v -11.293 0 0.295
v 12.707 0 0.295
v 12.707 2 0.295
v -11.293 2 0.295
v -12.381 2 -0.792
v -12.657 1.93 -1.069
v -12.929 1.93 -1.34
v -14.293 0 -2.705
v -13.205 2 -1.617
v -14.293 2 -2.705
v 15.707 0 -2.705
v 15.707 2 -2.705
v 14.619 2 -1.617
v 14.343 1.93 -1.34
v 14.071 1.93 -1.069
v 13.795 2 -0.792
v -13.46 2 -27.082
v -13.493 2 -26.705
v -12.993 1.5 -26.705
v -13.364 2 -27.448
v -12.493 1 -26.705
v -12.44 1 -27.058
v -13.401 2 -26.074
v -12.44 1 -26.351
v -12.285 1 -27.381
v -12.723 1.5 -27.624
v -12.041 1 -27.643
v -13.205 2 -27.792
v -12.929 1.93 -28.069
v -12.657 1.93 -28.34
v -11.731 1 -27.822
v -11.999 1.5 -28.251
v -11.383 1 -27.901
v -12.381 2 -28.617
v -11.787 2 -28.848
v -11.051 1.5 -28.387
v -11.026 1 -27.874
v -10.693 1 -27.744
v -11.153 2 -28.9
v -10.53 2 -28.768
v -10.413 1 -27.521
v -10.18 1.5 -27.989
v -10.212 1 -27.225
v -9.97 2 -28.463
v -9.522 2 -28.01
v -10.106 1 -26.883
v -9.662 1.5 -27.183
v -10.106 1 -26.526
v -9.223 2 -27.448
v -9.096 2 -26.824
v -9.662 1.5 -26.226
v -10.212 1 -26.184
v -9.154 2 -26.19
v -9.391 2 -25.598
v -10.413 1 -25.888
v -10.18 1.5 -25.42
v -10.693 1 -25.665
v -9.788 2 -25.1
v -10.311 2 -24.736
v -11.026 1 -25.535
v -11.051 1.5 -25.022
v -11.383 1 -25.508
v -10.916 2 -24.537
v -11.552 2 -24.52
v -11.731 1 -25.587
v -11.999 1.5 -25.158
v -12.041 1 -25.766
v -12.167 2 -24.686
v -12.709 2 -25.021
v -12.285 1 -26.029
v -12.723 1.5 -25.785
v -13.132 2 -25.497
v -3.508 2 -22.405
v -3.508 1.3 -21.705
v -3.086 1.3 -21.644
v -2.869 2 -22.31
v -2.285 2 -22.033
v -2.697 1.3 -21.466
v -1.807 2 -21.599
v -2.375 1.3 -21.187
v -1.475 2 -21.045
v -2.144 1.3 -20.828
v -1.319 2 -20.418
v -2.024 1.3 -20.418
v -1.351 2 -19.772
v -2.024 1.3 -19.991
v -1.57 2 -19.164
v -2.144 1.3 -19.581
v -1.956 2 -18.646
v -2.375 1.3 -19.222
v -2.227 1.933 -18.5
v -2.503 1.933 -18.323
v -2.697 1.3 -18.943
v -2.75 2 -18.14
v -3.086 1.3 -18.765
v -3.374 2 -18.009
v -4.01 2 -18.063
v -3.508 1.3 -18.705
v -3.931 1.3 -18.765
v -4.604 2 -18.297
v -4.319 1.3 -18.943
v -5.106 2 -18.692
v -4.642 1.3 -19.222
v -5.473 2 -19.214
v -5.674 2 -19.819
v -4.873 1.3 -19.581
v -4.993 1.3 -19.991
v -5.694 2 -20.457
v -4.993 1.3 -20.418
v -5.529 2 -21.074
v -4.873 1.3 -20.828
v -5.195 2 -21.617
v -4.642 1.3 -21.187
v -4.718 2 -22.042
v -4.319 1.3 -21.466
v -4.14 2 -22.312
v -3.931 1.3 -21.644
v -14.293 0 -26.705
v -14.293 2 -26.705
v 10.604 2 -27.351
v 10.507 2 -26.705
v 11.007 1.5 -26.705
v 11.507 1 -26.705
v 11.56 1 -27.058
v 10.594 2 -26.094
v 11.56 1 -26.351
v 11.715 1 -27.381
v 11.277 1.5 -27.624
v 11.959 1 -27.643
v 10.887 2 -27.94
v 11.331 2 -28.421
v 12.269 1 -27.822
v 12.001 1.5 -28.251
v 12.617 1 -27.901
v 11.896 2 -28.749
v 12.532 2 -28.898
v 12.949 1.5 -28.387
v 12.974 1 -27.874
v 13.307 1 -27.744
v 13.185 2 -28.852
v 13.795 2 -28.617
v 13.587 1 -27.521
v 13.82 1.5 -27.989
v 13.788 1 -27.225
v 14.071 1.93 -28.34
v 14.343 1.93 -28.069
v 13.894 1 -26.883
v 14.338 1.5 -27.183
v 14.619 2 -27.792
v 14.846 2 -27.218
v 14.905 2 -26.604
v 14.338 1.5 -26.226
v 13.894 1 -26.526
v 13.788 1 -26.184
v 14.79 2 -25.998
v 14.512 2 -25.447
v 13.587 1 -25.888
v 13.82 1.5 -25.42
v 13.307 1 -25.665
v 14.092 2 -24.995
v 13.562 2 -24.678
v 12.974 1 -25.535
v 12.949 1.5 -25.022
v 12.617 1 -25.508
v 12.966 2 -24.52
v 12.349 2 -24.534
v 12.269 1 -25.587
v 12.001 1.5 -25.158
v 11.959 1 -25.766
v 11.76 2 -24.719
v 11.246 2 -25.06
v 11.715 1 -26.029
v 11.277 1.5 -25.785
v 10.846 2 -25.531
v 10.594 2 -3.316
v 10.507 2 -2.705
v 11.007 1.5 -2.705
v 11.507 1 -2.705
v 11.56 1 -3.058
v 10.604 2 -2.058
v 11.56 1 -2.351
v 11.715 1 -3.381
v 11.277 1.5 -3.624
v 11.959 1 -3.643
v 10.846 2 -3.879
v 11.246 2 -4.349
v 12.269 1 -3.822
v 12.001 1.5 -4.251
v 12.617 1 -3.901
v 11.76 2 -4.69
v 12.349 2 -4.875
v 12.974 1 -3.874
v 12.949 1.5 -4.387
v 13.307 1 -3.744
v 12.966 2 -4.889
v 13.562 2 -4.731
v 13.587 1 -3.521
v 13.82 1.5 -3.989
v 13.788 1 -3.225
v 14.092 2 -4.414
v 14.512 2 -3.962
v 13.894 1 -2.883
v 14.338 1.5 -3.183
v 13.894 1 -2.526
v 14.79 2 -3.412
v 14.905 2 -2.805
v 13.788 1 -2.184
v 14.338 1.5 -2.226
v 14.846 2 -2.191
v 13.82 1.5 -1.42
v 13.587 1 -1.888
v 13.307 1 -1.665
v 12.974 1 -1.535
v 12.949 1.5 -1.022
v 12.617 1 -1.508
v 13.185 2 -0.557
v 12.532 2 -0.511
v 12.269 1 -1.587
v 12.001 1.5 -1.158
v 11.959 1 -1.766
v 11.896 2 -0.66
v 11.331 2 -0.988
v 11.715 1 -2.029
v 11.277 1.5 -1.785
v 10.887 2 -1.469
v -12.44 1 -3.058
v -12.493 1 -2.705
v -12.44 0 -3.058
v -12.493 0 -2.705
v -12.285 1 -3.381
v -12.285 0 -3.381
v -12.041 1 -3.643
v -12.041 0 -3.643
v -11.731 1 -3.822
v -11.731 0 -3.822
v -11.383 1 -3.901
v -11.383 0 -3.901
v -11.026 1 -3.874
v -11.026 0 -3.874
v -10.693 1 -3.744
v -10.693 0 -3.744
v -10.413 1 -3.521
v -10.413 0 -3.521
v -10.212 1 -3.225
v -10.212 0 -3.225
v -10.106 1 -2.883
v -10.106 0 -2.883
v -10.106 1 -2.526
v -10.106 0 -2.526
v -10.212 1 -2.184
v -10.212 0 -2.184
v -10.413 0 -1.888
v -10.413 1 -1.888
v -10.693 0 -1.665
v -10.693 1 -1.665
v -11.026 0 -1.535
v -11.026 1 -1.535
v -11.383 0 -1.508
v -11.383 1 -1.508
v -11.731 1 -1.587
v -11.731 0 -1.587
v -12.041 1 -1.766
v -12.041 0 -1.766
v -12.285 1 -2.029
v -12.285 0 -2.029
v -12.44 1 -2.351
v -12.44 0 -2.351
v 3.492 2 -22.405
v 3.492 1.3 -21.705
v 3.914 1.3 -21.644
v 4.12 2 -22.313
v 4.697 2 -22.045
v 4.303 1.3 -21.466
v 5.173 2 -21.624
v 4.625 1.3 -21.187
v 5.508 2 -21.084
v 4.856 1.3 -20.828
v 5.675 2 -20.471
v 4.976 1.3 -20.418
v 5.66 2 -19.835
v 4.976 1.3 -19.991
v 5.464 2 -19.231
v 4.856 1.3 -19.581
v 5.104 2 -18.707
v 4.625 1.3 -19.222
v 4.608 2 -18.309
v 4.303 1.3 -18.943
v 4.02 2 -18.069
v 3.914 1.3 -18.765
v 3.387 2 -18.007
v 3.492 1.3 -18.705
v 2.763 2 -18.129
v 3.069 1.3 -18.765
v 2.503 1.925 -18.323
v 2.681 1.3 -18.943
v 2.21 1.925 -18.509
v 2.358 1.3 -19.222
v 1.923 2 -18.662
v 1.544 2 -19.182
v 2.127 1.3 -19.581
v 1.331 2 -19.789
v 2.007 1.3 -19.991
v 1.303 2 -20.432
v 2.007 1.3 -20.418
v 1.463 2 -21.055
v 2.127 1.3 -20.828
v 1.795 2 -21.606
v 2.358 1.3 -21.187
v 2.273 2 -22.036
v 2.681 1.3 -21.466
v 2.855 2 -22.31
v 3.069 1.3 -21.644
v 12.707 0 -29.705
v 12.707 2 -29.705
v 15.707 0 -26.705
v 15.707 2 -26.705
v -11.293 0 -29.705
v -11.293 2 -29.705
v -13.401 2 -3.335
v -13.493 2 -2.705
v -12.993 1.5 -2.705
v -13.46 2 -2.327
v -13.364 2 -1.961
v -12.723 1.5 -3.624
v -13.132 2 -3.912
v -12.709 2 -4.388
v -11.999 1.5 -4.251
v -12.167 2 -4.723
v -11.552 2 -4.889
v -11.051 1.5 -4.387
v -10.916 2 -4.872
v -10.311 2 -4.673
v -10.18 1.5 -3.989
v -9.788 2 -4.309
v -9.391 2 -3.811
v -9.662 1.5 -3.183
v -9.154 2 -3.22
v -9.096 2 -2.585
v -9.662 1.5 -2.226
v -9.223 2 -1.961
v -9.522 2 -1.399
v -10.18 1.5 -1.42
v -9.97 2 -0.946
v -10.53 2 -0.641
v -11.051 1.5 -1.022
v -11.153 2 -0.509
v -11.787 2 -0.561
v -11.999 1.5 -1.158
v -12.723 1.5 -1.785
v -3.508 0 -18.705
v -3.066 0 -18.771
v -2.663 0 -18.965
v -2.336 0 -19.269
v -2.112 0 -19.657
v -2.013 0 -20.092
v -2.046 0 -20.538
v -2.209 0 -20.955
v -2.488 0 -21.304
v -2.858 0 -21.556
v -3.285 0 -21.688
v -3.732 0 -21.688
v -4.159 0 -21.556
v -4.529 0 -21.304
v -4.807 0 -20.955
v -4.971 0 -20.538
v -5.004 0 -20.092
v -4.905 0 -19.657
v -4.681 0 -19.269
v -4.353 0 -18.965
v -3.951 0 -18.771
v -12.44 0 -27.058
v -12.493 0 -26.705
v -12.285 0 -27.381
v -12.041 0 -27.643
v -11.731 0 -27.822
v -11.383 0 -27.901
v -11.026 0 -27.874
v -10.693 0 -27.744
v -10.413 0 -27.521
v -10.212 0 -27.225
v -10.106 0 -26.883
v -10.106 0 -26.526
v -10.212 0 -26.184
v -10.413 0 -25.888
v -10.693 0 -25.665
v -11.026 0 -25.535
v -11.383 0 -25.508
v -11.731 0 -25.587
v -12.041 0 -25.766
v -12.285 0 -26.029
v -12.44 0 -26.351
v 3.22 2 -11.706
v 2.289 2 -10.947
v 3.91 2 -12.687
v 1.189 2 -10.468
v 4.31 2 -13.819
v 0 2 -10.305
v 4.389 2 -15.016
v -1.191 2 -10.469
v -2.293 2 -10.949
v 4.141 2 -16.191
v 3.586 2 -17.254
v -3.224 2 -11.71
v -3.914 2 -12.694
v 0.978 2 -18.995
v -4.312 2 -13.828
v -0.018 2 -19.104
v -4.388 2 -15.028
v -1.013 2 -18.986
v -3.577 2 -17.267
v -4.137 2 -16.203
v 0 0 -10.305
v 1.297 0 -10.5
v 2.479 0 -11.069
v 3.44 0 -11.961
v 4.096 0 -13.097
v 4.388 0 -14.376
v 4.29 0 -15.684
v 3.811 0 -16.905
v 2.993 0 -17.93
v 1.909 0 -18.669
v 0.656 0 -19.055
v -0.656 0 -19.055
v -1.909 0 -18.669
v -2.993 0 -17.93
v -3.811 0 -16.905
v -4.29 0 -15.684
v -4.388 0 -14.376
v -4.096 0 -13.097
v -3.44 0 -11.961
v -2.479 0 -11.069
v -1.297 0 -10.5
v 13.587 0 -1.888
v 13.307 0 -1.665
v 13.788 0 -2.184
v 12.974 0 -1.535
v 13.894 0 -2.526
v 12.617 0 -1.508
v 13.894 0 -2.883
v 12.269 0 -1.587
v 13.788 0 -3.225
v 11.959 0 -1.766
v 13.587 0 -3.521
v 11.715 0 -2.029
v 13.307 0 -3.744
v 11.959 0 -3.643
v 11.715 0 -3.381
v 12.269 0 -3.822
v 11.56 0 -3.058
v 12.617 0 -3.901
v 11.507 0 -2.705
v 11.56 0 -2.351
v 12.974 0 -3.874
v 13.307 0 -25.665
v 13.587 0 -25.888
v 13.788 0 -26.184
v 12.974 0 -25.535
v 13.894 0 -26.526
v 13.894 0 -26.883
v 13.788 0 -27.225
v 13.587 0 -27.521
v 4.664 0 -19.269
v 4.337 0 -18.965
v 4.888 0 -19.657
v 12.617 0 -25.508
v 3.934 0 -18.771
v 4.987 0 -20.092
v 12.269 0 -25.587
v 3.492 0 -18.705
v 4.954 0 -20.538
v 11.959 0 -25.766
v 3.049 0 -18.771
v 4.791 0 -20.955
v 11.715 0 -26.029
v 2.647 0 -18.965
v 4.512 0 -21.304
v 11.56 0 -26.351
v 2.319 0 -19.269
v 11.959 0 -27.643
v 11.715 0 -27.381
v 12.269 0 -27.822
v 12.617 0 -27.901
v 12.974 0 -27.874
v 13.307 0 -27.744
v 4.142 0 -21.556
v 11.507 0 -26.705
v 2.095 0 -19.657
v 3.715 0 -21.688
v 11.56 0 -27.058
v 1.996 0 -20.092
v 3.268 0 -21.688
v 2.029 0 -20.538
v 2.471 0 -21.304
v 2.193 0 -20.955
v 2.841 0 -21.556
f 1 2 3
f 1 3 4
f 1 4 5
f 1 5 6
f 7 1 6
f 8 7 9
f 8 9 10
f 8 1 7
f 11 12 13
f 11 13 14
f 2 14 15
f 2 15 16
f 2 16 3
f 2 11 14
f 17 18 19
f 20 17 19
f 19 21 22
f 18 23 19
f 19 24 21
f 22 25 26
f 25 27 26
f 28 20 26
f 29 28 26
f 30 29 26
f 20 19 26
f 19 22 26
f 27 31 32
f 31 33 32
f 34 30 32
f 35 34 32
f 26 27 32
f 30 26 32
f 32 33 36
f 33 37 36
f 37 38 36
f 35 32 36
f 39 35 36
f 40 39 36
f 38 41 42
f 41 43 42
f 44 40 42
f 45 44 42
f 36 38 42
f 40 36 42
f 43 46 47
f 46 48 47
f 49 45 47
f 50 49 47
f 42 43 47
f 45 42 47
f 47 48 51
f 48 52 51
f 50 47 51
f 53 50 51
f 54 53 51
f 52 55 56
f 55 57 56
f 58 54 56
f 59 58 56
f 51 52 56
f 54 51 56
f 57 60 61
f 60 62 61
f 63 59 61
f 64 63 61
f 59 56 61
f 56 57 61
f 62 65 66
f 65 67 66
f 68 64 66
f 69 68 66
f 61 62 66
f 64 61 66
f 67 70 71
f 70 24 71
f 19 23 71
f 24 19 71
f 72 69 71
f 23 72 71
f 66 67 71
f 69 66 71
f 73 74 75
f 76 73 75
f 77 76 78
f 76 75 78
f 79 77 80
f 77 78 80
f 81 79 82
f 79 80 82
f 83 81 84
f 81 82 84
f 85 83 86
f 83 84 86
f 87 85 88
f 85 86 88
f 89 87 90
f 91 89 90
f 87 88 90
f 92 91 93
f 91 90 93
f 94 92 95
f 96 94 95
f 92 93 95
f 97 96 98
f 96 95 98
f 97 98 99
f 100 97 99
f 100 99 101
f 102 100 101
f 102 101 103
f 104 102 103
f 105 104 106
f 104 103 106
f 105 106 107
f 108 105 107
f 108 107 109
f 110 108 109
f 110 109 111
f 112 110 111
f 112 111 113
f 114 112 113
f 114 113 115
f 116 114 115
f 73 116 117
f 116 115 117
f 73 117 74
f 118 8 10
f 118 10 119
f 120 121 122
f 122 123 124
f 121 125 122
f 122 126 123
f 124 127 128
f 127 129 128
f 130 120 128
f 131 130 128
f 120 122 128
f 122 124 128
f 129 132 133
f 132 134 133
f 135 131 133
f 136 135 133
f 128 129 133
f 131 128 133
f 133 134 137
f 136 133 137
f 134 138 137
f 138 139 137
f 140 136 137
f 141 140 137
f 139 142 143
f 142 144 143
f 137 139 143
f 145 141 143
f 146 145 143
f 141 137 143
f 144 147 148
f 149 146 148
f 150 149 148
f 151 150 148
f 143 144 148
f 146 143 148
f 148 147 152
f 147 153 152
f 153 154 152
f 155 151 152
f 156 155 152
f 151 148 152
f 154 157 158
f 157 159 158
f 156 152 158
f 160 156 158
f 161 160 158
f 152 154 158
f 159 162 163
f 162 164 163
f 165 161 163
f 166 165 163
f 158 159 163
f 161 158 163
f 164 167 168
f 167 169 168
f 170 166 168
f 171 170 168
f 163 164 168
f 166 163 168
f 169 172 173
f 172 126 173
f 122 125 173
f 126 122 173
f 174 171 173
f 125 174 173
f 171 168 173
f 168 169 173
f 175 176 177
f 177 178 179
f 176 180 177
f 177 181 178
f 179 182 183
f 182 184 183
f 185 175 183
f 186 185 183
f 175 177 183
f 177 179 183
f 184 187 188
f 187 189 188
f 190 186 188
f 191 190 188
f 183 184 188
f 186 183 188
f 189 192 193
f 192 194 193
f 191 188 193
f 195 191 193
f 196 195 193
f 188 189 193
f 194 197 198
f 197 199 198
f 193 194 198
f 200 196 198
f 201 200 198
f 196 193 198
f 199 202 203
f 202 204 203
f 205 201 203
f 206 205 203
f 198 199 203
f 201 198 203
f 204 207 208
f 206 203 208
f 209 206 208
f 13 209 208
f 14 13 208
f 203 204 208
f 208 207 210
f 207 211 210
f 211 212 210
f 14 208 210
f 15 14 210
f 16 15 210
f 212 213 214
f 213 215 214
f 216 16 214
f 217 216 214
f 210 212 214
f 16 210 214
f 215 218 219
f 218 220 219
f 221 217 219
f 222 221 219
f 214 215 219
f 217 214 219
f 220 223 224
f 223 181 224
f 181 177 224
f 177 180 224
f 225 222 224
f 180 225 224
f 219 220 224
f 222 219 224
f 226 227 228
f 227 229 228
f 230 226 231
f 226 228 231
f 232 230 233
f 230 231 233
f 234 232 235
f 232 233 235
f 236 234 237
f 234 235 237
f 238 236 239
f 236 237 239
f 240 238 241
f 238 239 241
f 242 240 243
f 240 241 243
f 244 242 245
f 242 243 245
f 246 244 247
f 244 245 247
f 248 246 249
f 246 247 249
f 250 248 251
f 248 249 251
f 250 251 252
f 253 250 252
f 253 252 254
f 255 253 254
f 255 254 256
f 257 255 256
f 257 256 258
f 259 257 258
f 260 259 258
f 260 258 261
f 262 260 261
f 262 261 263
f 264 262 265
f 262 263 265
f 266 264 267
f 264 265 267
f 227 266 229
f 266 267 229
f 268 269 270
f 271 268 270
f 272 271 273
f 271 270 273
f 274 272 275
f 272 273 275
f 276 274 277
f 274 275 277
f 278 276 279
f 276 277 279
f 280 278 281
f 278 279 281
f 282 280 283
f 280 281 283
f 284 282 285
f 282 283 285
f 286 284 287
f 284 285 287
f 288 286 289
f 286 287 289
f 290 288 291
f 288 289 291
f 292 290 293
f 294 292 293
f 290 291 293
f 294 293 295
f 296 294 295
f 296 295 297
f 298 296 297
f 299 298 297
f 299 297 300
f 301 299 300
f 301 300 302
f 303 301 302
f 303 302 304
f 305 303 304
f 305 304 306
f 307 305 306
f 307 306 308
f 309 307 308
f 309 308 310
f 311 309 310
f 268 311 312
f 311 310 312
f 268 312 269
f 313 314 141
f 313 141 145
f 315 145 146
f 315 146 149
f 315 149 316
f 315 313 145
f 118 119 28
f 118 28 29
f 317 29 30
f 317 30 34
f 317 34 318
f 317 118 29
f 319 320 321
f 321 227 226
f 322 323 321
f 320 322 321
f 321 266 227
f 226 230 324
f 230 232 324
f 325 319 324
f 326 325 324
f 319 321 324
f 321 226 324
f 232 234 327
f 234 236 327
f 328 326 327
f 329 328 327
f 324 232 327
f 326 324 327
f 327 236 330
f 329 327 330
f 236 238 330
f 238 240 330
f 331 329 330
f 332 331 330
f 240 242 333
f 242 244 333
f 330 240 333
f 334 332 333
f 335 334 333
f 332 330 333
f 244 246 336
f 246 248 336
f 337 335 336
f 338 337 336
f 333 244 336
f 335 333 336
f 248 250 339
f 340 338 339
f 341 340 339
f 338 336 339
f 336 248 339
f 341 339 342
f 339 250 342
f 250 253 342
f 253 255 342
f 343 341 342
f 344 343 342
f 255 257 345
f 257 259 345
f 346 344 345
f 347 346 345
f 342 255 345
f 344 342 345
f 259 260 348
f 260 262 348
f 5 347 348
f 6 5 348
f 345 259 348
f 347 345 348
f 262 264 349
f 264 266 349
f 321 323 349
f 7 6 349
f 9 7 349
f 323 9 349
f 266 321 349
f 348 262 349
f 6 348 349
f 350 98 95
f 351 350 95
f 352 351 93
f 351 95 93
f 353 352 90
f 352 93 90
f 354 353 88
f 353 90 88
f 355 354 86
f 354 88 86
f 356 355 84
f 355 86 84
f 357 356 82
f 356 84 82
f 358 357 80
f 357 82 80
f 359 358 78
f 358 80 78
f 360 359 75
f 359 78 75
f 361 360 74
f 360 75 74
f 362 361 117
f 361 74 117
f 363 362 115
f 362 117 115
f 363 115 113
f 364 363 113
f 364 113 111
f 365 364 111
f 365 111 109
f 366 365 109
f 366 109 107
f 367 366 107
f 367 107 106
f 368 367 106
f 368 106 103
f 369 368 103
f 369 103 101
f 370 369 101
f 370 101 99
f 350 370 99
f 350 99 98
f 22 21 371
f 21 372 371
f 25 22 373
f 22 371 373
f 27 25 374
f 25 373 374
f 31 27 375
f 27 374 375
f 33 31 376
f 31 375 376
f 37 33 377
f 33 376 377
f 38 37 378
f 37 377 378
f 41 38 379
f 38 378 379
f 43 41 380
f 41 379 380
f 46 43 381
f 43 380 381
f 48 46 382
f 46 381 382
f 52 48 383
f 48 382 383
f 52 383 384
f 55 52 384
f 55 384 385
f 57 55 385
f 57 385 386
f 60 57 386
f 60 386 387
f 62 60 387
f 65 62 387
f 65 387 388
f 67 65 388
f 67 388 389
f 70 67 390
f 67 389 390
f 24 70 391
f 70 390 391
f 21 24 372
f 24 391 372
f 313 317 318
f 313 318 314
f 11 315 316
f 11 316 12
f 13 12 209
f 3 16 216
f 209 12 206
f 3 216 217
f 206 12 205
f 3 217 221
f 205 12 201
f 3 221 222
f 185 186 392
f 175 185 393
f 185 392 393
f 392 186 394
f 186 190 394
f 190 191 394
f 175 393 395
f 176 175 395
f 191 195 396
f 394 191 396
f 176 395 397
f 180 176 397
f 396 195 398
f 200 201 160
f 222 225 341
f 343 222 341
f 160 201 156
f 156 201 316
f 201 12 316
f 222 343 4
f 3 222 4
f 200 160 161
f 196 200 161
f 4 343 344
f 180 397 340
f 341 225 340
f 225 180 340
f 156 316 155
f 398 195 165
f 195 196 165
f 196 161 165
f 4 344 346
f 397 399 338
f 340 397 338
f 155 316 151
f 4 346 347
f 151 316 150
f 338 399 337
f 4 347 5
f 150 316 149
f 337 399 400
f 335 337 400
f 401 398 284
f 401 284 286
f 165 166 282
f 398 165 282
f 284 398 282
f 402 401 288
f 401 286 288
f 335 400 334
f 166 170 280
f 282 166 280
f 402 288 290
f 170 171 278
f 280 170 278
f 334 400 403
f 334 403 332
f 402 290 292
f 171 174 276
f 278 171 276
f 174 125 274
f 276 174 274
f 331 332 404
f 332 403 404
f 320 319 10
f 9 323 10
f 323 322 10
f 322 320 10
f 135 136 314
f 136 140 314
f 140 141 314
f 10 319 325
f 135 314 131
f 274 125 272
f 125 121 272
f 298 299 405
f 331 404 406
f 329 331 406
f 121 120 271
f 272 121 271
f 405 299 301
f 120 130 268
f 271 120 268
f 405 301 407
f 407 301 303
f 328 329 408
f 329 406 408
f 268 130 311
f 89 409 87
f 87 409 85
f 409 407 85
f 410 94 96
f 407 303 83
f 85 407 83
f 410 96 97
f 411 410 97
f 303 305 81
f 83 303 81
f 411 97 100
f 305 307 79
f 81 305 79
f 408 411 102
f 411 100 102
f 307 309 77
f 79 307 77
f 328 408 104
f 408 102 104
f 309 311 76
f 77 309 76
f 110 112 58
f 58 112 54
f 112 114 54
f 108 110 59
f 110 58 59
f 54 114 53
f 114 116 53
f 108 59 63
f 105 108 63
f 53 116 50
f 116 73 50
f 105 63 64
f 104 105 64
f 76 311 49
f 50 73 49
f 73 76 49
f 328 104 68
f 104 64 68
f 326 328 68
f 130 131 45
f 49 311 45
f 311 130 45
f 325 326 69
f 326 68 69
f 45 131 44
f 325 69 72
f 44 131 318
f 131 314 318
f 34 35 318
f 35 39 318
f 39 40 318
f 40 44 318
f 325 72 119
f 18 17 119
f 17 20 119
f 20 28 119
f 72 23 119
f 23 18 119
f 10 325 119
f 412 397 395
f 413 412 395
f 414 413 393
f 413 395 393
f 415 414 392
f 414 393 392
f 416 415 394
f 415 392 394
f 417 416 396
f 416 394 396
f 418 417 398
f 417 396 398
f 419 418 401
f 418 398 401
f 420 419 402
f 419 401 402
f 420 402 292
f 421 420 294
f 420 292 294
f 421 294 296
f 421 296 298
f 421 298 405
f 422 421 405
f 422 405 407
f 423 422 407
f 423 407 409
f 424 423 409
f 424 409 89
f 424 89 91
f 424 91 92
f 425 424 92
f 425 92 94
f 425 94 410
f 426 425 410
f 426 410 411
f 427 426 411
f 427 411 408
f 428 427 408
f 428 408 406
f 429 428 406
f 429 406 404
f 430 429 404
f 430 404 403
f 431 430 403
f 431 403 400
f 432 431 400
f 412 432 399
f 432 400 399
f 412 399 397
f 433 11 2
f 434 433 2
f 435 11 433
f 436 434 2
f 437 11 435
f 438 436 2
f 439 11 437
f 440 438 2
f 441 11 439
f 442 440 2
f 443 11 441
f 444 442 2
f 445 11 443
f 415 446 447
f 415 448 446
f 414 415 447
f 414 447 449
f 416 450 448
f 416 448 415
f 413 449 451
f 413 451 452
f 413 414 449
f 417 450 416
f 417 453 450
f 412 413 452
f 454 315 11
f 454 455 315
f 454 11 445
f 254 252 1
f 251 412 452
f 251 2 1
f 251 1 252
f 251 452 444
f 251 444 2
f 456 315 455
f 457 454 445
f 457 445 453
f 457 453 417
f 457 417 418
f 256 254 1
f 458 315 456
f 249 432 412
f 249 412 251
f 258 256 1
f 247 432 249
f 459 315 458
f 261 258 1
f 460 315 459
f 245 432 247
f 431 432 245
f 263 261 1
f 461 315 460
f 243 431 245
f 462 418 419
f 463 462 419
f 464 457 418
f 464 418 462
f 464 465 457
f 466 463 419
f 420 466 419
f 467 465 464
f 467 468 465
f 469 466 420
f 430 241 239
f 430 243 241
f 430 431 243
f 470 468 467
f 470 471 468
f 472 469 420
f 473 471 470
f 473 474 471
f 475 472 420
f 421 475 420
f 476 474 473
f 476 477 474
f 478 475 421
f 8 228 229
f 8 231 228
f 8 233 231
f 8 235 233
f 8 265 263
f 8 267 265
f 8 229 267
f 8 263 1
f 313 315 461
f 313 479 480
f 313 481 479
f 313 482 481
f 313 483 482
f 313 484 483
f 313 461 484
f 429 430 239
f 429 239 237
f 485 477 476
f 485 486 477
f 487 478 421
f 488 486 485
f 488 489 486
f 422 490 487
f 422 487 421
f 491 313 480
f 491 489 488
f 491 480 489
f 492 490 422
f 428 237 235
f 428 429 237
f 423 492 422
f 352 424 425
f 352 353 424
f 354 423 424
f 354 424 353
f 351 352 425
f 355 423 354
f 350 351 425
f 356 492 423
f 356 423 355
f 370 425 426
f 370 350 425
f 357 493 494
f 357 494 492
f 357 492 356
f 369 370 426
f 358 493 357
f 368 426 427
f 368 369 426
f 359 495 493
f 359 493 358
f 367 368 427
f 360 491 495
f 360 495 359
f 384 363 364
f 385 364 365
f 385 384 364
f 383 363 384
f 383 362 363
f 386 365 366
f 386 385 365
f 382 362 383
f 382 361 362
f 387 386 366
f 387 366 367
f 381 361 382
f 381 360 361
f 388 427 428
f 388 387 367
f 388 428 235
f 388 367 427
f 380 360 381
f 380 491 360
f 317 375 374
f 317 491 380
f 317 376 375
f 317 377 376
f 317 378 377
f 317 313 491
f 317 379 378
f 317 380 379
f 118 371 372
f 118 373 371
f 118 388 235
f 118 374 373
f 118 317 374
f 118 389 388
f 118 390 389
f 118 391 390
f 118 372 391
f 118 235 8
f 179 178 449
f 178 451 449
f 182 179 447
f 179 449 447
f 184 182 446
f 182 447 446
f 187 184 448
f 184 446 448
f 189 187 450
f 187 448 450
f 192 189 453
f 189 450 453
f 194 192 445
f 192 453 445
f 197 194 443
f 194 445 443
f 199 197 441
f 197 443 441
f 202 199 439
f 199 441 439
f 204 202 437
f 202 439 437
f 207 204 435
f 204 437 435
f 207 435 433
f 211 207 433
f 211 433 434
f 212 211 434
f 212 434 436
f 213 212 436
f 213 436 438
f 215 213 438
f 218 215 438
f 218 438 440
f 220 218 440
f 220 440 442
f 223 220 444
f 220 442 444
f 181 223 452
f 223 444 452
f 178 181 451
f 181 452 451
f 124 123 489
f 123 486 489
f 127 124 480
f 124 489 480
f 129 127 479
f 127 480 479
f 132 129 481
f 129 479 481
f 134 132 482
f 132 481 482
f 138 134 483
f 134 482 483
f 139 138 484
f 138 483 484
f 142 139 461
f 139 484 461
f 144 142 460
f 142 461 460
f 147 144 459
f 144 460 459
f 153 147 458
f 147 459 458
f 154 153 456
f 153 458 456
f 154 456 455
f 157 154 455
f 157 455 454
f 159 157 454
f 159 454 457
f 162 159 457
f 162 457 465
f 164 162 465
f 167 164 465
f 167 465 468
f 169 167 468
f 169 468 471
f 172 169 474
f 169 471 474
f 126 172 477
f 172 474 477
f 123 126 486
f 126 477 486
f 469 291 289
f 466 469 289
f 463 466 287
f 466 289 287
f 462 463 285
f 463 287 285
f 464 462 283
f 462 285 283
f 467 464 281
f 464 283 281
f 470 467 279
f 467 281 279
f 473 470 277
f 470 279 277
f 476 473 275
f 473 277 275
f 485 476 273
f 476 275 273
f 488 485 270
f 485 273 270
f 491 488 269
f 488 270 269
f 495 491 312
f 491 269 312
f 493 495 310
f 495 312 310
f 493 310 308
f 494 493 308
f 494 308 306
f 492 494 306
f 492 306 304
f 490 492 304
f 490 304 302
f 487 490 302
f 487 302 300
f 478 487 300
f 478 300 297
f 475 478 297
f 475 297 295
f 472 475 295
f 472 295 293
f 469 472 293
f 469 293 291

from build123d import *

# Parameters (mm, degrees)
BOSS_EXTRUDE1_DEPTH                             = 2
SKETCH2_R                                       = 4.4
CUT_EXTRUDE1_DEPTH                              = 34.661067402
CUT_EXTRUDE2_REACH                              = 35.661
SKETCH5_R                                       = 1.5
CSK_FOR_M2_FLAT_HEAD_MACHINE_SCREW1_D           = 2.4
CSK_FOR_M2_FLAT_HEAD_MACHINE_SCREW1_DEPTH       = 42.93
CSK_FOR_M2_FLAT_HEAD_MACHINE_SCREW1_CSINK_D     = 4.4
CSK_FOR_M2_FLAT_HEAD_MACHINE_SCREW1_CSINK_ANGLE = 90
CSK_FOR_M2_FLAT_HEAD_MACHINE_SCREW1_TIP         = 0.721032743
CSK_FOR_M2_FLAT_HEAD_MACHINE_SCREW2_D           = 2.4
CSK_FOR_M2_FLAT_HEAD_MACHINE_SCREW2_DEPTH       = 42.93
CSK_FOR_M2_FLAT_HEAD_MACHINE_SCREW2_CSINK_D     = 4.4
CSK_FOR_M2_FLAT_HEAD_MACHINE_SCREW2_CSINK_ANGLE = 90
CSK_FOR_M2_FLAT_HEAD_MACHINE_SCREW2_TIP         = 0.721032743


with BuildPart() as part:
    # Sketch1 → Boss-Extrude1 (new body)
    with BuildSketch(Plane(origin=(0, 0, 0), x_dir=(1, 0, 0), z_dir=(0, 1, 0))):
        Polygon((-11.293051345, 29.704532022), (12.706948655, 29.704532022), (15.706948655, 26.704532022), (15.706948655, 2.704532022), (12.706948655, -0.295467978), (-11.293051345, -0.295467978), (-14.293051345, 2.704532022), (-14.293051345, 26.704532022), align=None)
    extrude(amount=BOSS_EXTRUDE1_DEPTH)

    # Sketch2 → Cut-Extrude1 (cut, through all)
    with BuildSketch(Plane(origin=(0, 2, 0), x_dir=(1, 0, 0), z_dir=(0, 1, 0))):
        with Locations(Location((0, 14.704532022, 0), (0, 0, 270))):
            Circle(SKETCH2_R)
    extrude(amount=-CUT_EXTRUDE1_DEPTH, mode=Mode.SUBTRACT)

    # Sketch5 → Cut-Extrude2 (cut, up to next)
    with BuildSketch(Plane(origin=(0, 2, 0), x_dir=(1, 0, 0), z_dir=(0, 1, 0)), mode=Mode.PRIVATE) as cut_extrude2_sk1:
        with Locations(Location((-3.508440786, 20.204532022, 0), (0, 0, 270))):
            Circle(SKETCH5_R)
    cut_extrude2_tool1 = extrude(cut_extrude2_sk1.sketch, amount=-CUT_EXTRUDE2_REACH, mode=Mode.PRIVATE) & part.part
    # Sketch5 → Cut-Extrude2 (cut, up to next)
    with BuildSketch(Plane(origin=(0, 2, 0), x_dir=(1, 0, 0), z_dir=(0, 1, 0)), mode=Mode.PRIVATE) as cut_extrude2_sk2:
        with Locations(Location((3.491559214, 20.204532022, 0), (0, 0, 270))):
            Circle(SKETCH5_R)
    cut_extrude2_tool2 = extrude(cut_extrude2_sk2.sketch, amount=-CUT_EXTRUDE2_REACH, mode=Mode.PRIVATE) & part.part
    add(cut_extrude2_tool1.solids().sort_by_distance((-3.508441, 2, -20.204532))[0], mode=Mode.SUBTRACT)
    add(cut_extrude2_tool2.solids().sort_by_distance((3.491559, 2, -20.204532))[0], mode=Mode.SUBTRACT)

    # CSK for M2 Flat Head Machine Screw1
    with Locations(Plane(origin=(-3.508440786, 2, -20.204532022), x_dir=(0, 0, 1), z_dir=(0, 1, 0))):
        with Locations((0, 0), (0, 7)):
            CounterSinkHole(CSK_FOR_M2_FLAT_HEAD_MACHINE_SCREW1_D / 2, CSK_FOR_M2_FLAT_HEAD_MACHINE_SCREW1_CSINK_D / 2, depth=CSK_FOR_M2_FLAT_HEAD_MACHINE_SCREW1_DEPTH, counter_sink_angle=CSK_FOR_M2_FLAT_HEAD_MACHINE_SCREW1_CSINK_ANGLE)
            with Locations((0, 0, -(CSK_FOR_M2_FLAT_HEAD_MACHINE_SCREW1_DEPTH + CSK_FOR_M2_FLAT_HEAD_MACHINE_SCREW1_TIP / 2))):  # 118° drill point
                Cone(0, CSK_FOR_M2_FLAT_HEAD_MACHINE_SCREW1_D / 2, CSK_FOR_M2_FLAT_HEAD_MACHINE_SCREW1_TIP, mode=Mode.SUBTRACT)

    # CSK for M2 Flat Head Machine Screw2
    with Locations(Plane(origin=(0, 2, 0), x_dir=(1, 0, 0), z_dir=(0, 1, 0))):
        with Locations((-11.293051345, 26.704532022), (-11.293051345, 2.704532022), (12.706948655, 26.704532022), (12.706948655, 2.704532022)):
            CounterSinkHole(CSK_FOR_M2_FLAT_HEAD_MACHINE_SCREW2_D / 2, CSK_FOR_M2_FLAT_HEAD_MACHINE_SCREW2_CSINK_D / 2, depth=CSK_FOR_M2_FLAT_HEAD_MACHINE_SCREW2_DEPTH, counter_sink_angle=CSK_FOR_M2_FLAT_HEAD_MACHINE_SCREW2_CSINK_ANGLE)
            with Locations((0, 0, -(CSK_FOR_M2_FLAT_HEAD_MACHINE_SCREW2_DEPTH + CSK_FOR_M2_FLAT_HEAD_MACHINE_SCREW2_TIP / 2))):  # 118° drill point
                Cone(0, CSK_FOR_M2_FLAT_HEAD_MACHINE_SCREW2_D / 2, CSK_FOR_M2_FLAT_HEAD_MACHINE_SCREW2_TIP, mode=Mode.SUBTRACT)


solid = part.part
